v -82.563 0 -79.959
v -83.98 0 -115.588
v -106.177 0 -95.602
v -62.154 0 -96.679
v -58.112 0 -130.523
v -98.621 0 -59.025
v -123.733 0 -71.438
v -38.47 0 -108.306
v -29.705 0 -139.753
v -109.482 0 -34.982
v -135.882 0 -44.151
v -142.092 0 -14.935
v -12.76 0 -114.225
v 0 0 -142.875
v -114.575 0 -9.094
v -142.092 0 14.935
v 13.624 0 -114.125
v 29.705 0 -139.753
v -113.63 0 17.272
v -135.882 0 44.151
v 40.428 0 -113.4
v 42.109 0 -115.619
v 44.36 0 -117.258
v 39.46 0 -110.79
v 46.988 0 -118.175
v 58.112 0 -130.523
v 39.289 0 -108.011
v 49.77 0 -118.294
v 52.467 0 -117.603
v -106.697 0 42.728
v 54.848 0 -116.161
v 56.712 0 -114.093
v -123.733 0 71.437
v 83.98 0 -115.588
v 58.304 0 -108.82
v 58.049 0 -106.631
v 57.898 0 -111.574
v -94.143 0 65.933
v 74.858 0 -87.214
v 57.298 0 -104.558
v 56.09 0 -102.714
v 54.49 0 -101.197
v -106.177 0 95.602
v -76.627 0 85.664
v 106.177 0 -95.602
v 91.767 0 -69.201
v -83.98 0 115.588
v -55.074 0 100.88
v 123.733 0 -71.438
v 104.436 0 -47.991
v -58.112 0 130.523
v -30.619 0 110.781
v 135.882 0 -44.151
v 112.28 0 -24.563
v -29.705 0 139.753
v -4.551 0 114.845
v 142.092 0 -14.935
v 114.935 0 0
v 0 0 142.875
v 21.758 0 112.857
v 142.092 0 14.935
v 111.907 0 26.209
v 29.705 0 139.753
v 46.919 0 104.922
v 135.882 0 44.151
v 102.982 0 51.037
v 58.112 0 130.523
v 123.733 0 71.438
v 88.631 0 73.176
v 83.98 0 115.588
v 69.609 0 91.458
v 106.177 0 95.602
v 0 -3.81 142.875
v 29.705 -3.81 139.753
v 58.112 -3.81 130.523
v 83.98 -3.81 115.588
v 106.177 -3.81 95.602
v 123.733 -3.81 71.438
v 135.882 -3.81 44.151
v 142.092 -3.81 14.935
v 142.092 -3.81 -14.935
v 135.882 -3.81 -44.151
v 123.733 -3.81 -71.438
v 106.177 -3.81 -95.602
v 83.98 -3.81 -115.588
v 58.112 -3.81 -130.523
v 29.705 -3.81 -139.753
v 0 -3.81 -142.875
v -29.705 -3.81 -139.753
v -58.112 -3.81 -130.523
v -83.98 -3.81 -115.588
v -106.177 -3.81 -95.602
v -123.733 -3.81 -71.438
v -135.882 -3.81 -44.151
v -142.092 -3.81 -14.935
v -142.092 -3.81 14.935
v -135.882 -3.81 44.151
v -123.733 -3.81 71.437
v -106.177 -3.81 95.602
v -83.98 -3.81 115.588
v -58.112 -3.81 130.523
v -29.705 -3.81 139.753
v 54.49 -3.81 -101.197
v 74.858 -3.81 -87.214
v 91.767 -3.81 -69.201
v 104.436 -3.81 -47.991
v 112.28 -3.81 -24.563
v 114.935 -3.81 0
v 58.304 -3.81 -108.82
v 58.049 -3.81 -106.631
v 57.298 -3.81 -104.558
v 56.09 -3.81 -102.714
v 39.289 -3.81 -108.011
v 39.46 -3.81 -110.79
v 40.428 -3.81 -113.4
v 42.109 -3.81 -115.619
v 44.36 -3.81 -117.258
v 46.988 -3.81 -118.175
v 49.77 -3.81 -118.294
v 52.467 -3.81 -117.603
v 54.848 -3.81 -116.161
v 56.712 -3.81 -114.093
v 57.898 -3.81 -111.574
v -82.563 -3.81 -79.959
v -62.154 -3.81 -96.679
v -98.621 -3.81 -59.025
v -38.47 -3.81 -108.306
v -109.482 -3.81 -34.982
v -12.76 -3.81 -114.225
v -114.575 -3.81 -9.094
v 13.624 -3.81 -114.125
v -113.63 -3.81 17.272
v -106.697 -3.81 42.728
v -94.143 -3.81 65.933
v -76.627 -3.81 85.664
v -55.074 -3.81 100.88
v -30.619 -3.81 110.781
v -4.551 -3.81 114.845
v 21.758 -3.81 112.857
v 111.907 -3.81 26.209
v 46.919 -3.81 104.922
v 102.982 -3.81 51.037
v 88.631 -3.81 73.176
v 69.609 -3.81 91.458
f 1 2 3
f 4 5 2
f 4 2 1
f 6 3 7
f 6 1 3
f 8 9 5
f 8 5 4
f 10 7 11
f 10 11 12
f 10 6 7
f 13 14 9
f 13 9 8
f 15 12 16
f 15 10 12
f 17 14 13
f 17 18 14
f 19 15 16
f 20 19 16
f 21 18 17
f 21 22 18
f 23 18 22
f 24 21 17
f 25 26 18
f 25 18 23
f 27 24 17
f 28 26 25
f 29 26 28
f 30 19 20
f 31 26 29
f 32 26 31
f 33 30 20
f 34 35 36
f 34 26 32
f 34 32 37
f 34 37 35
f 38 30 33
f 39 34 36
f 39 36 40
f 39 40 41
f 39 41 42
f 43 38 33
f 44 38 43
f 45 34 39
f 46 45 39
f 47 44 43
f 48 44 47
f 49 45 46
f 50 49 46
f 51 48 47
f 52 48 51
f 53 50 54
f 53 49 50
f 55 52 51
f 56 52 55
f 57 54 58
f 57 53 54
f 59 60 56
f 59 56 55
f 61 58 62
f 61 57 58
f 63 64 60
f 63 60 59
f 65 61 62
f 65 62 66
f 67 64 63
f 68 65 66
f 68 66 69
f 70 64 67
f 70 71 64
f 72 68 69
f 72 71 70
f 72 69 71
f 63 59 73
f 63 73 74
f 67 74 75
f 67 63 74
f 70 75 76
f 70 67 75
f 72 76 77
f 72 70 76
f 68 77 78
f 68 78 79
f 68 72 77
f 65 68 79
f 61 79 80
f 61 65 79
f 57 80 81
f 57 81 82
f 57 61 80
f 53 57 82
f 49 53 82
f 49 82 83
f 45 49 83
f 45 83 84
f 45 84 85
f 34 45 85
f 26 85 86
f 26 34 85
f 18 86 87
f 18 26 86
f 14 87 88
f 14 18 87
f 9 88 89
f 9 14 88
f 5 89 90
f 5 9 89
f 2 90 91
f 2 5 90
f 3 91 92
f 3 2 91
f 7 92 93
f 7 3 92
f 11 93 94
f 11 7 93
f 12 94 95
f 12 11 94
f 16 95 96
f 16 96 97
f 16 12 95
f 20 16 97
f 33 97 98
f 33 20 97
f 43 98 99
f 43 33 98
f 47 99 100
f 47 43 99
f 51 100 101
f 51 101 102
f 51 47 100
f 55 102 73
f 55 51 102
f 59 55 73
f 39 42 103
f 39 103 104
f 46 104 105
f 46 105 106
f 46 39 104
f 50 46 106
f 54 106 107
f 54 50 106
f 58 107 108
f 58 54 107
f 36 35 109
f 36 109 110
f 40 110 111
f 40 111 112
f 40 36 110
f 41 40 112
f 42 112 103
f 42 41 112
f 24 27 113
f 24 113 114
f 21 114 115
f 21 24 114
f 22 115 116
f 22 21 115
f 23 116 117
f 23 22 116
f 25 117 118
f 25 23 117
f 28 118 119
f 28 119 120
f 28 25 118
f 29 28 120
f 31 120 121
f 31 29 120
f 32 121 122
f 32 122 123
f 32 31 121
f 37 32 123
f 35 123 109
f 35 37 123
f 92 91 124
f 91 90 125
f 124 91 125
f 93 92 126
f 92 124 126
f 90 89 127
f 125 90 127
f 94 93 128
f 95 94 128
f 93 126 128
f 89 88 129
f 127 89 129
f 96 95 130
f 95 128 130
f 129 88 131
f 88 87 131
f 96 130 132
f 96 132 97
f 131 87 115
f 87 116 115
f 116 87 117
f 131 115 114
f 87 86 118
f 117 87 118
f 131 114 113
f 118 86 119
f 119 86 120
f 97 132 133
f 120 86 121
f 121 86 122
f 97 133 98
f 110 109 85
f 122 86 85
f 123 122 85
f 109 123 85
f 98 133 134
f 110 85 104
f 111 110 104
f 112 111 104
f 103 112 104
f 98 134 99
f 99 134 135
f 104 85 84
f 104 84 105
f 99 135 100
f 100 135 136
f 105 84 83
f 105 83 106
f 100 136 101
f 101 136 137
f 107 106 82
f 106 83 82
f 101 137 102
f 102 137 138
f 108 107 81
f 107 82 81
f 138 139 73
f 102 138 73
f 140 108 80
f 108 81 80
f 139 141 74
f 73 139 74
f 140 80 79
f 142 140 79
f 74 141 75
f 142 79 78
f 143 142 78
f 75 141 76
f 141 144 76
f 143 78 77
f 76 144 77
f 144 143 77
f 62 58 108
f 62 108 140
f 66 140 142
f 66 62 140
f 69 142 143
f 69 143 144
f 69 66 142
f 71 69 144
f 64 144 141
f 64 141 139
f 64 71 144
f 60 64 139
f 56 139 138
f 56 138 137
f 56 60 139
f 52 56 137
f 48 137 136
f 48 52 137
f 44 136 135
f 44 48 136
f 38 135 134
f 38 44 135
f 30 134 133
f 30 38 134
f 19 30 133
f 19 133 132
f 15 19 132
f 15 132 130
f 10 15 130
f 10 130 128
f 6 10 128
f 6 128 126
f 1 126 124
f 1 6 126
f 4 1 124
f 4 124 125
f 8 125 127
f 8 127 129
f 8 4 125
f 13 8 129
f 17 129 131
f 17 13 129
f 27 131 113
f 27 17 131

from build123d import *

# Parameters (mm, degrees)
SKETCH1_R           = 142.875
BOSS_EXTRUDE2_DEPTH = 3.81


with BuildPart() as part:
    # Sketch1 → Boss-Extrude2 (new body)
    with BuildSketch(Plane(origin=(0, 0, 0), x_dir=(1, 0, 0), z_dir=(0, 1, 0))):
        with Locations(Location((0, 0, 0), (0, 0, 270))):
            Circle(SKETCH1_R)
        with BuildLine():
            ThreePointArc((54.490337546, 101.1971212), (98.67345431, 58.937285648), (114.935, 0))
            ThreePointArc((114.935, 0), (-94.142770704, -65.933246159), (39.288887865, 108.011284204))
            ThreePointArc((39.288887865, 108.011284204), (48.374639999, 118.336615411), (58.304474981, 108.820222521))
            ThreePointArc((58.304474981, 108.820222521), (57.297737448, 104.558200756), (54.490337546, 101.1971212))
        make_face(mode=Mode.SUBTRACT)
    extrude(amount=-BOSS_EXTRUDE2_DEPTH)


solid = part.part
